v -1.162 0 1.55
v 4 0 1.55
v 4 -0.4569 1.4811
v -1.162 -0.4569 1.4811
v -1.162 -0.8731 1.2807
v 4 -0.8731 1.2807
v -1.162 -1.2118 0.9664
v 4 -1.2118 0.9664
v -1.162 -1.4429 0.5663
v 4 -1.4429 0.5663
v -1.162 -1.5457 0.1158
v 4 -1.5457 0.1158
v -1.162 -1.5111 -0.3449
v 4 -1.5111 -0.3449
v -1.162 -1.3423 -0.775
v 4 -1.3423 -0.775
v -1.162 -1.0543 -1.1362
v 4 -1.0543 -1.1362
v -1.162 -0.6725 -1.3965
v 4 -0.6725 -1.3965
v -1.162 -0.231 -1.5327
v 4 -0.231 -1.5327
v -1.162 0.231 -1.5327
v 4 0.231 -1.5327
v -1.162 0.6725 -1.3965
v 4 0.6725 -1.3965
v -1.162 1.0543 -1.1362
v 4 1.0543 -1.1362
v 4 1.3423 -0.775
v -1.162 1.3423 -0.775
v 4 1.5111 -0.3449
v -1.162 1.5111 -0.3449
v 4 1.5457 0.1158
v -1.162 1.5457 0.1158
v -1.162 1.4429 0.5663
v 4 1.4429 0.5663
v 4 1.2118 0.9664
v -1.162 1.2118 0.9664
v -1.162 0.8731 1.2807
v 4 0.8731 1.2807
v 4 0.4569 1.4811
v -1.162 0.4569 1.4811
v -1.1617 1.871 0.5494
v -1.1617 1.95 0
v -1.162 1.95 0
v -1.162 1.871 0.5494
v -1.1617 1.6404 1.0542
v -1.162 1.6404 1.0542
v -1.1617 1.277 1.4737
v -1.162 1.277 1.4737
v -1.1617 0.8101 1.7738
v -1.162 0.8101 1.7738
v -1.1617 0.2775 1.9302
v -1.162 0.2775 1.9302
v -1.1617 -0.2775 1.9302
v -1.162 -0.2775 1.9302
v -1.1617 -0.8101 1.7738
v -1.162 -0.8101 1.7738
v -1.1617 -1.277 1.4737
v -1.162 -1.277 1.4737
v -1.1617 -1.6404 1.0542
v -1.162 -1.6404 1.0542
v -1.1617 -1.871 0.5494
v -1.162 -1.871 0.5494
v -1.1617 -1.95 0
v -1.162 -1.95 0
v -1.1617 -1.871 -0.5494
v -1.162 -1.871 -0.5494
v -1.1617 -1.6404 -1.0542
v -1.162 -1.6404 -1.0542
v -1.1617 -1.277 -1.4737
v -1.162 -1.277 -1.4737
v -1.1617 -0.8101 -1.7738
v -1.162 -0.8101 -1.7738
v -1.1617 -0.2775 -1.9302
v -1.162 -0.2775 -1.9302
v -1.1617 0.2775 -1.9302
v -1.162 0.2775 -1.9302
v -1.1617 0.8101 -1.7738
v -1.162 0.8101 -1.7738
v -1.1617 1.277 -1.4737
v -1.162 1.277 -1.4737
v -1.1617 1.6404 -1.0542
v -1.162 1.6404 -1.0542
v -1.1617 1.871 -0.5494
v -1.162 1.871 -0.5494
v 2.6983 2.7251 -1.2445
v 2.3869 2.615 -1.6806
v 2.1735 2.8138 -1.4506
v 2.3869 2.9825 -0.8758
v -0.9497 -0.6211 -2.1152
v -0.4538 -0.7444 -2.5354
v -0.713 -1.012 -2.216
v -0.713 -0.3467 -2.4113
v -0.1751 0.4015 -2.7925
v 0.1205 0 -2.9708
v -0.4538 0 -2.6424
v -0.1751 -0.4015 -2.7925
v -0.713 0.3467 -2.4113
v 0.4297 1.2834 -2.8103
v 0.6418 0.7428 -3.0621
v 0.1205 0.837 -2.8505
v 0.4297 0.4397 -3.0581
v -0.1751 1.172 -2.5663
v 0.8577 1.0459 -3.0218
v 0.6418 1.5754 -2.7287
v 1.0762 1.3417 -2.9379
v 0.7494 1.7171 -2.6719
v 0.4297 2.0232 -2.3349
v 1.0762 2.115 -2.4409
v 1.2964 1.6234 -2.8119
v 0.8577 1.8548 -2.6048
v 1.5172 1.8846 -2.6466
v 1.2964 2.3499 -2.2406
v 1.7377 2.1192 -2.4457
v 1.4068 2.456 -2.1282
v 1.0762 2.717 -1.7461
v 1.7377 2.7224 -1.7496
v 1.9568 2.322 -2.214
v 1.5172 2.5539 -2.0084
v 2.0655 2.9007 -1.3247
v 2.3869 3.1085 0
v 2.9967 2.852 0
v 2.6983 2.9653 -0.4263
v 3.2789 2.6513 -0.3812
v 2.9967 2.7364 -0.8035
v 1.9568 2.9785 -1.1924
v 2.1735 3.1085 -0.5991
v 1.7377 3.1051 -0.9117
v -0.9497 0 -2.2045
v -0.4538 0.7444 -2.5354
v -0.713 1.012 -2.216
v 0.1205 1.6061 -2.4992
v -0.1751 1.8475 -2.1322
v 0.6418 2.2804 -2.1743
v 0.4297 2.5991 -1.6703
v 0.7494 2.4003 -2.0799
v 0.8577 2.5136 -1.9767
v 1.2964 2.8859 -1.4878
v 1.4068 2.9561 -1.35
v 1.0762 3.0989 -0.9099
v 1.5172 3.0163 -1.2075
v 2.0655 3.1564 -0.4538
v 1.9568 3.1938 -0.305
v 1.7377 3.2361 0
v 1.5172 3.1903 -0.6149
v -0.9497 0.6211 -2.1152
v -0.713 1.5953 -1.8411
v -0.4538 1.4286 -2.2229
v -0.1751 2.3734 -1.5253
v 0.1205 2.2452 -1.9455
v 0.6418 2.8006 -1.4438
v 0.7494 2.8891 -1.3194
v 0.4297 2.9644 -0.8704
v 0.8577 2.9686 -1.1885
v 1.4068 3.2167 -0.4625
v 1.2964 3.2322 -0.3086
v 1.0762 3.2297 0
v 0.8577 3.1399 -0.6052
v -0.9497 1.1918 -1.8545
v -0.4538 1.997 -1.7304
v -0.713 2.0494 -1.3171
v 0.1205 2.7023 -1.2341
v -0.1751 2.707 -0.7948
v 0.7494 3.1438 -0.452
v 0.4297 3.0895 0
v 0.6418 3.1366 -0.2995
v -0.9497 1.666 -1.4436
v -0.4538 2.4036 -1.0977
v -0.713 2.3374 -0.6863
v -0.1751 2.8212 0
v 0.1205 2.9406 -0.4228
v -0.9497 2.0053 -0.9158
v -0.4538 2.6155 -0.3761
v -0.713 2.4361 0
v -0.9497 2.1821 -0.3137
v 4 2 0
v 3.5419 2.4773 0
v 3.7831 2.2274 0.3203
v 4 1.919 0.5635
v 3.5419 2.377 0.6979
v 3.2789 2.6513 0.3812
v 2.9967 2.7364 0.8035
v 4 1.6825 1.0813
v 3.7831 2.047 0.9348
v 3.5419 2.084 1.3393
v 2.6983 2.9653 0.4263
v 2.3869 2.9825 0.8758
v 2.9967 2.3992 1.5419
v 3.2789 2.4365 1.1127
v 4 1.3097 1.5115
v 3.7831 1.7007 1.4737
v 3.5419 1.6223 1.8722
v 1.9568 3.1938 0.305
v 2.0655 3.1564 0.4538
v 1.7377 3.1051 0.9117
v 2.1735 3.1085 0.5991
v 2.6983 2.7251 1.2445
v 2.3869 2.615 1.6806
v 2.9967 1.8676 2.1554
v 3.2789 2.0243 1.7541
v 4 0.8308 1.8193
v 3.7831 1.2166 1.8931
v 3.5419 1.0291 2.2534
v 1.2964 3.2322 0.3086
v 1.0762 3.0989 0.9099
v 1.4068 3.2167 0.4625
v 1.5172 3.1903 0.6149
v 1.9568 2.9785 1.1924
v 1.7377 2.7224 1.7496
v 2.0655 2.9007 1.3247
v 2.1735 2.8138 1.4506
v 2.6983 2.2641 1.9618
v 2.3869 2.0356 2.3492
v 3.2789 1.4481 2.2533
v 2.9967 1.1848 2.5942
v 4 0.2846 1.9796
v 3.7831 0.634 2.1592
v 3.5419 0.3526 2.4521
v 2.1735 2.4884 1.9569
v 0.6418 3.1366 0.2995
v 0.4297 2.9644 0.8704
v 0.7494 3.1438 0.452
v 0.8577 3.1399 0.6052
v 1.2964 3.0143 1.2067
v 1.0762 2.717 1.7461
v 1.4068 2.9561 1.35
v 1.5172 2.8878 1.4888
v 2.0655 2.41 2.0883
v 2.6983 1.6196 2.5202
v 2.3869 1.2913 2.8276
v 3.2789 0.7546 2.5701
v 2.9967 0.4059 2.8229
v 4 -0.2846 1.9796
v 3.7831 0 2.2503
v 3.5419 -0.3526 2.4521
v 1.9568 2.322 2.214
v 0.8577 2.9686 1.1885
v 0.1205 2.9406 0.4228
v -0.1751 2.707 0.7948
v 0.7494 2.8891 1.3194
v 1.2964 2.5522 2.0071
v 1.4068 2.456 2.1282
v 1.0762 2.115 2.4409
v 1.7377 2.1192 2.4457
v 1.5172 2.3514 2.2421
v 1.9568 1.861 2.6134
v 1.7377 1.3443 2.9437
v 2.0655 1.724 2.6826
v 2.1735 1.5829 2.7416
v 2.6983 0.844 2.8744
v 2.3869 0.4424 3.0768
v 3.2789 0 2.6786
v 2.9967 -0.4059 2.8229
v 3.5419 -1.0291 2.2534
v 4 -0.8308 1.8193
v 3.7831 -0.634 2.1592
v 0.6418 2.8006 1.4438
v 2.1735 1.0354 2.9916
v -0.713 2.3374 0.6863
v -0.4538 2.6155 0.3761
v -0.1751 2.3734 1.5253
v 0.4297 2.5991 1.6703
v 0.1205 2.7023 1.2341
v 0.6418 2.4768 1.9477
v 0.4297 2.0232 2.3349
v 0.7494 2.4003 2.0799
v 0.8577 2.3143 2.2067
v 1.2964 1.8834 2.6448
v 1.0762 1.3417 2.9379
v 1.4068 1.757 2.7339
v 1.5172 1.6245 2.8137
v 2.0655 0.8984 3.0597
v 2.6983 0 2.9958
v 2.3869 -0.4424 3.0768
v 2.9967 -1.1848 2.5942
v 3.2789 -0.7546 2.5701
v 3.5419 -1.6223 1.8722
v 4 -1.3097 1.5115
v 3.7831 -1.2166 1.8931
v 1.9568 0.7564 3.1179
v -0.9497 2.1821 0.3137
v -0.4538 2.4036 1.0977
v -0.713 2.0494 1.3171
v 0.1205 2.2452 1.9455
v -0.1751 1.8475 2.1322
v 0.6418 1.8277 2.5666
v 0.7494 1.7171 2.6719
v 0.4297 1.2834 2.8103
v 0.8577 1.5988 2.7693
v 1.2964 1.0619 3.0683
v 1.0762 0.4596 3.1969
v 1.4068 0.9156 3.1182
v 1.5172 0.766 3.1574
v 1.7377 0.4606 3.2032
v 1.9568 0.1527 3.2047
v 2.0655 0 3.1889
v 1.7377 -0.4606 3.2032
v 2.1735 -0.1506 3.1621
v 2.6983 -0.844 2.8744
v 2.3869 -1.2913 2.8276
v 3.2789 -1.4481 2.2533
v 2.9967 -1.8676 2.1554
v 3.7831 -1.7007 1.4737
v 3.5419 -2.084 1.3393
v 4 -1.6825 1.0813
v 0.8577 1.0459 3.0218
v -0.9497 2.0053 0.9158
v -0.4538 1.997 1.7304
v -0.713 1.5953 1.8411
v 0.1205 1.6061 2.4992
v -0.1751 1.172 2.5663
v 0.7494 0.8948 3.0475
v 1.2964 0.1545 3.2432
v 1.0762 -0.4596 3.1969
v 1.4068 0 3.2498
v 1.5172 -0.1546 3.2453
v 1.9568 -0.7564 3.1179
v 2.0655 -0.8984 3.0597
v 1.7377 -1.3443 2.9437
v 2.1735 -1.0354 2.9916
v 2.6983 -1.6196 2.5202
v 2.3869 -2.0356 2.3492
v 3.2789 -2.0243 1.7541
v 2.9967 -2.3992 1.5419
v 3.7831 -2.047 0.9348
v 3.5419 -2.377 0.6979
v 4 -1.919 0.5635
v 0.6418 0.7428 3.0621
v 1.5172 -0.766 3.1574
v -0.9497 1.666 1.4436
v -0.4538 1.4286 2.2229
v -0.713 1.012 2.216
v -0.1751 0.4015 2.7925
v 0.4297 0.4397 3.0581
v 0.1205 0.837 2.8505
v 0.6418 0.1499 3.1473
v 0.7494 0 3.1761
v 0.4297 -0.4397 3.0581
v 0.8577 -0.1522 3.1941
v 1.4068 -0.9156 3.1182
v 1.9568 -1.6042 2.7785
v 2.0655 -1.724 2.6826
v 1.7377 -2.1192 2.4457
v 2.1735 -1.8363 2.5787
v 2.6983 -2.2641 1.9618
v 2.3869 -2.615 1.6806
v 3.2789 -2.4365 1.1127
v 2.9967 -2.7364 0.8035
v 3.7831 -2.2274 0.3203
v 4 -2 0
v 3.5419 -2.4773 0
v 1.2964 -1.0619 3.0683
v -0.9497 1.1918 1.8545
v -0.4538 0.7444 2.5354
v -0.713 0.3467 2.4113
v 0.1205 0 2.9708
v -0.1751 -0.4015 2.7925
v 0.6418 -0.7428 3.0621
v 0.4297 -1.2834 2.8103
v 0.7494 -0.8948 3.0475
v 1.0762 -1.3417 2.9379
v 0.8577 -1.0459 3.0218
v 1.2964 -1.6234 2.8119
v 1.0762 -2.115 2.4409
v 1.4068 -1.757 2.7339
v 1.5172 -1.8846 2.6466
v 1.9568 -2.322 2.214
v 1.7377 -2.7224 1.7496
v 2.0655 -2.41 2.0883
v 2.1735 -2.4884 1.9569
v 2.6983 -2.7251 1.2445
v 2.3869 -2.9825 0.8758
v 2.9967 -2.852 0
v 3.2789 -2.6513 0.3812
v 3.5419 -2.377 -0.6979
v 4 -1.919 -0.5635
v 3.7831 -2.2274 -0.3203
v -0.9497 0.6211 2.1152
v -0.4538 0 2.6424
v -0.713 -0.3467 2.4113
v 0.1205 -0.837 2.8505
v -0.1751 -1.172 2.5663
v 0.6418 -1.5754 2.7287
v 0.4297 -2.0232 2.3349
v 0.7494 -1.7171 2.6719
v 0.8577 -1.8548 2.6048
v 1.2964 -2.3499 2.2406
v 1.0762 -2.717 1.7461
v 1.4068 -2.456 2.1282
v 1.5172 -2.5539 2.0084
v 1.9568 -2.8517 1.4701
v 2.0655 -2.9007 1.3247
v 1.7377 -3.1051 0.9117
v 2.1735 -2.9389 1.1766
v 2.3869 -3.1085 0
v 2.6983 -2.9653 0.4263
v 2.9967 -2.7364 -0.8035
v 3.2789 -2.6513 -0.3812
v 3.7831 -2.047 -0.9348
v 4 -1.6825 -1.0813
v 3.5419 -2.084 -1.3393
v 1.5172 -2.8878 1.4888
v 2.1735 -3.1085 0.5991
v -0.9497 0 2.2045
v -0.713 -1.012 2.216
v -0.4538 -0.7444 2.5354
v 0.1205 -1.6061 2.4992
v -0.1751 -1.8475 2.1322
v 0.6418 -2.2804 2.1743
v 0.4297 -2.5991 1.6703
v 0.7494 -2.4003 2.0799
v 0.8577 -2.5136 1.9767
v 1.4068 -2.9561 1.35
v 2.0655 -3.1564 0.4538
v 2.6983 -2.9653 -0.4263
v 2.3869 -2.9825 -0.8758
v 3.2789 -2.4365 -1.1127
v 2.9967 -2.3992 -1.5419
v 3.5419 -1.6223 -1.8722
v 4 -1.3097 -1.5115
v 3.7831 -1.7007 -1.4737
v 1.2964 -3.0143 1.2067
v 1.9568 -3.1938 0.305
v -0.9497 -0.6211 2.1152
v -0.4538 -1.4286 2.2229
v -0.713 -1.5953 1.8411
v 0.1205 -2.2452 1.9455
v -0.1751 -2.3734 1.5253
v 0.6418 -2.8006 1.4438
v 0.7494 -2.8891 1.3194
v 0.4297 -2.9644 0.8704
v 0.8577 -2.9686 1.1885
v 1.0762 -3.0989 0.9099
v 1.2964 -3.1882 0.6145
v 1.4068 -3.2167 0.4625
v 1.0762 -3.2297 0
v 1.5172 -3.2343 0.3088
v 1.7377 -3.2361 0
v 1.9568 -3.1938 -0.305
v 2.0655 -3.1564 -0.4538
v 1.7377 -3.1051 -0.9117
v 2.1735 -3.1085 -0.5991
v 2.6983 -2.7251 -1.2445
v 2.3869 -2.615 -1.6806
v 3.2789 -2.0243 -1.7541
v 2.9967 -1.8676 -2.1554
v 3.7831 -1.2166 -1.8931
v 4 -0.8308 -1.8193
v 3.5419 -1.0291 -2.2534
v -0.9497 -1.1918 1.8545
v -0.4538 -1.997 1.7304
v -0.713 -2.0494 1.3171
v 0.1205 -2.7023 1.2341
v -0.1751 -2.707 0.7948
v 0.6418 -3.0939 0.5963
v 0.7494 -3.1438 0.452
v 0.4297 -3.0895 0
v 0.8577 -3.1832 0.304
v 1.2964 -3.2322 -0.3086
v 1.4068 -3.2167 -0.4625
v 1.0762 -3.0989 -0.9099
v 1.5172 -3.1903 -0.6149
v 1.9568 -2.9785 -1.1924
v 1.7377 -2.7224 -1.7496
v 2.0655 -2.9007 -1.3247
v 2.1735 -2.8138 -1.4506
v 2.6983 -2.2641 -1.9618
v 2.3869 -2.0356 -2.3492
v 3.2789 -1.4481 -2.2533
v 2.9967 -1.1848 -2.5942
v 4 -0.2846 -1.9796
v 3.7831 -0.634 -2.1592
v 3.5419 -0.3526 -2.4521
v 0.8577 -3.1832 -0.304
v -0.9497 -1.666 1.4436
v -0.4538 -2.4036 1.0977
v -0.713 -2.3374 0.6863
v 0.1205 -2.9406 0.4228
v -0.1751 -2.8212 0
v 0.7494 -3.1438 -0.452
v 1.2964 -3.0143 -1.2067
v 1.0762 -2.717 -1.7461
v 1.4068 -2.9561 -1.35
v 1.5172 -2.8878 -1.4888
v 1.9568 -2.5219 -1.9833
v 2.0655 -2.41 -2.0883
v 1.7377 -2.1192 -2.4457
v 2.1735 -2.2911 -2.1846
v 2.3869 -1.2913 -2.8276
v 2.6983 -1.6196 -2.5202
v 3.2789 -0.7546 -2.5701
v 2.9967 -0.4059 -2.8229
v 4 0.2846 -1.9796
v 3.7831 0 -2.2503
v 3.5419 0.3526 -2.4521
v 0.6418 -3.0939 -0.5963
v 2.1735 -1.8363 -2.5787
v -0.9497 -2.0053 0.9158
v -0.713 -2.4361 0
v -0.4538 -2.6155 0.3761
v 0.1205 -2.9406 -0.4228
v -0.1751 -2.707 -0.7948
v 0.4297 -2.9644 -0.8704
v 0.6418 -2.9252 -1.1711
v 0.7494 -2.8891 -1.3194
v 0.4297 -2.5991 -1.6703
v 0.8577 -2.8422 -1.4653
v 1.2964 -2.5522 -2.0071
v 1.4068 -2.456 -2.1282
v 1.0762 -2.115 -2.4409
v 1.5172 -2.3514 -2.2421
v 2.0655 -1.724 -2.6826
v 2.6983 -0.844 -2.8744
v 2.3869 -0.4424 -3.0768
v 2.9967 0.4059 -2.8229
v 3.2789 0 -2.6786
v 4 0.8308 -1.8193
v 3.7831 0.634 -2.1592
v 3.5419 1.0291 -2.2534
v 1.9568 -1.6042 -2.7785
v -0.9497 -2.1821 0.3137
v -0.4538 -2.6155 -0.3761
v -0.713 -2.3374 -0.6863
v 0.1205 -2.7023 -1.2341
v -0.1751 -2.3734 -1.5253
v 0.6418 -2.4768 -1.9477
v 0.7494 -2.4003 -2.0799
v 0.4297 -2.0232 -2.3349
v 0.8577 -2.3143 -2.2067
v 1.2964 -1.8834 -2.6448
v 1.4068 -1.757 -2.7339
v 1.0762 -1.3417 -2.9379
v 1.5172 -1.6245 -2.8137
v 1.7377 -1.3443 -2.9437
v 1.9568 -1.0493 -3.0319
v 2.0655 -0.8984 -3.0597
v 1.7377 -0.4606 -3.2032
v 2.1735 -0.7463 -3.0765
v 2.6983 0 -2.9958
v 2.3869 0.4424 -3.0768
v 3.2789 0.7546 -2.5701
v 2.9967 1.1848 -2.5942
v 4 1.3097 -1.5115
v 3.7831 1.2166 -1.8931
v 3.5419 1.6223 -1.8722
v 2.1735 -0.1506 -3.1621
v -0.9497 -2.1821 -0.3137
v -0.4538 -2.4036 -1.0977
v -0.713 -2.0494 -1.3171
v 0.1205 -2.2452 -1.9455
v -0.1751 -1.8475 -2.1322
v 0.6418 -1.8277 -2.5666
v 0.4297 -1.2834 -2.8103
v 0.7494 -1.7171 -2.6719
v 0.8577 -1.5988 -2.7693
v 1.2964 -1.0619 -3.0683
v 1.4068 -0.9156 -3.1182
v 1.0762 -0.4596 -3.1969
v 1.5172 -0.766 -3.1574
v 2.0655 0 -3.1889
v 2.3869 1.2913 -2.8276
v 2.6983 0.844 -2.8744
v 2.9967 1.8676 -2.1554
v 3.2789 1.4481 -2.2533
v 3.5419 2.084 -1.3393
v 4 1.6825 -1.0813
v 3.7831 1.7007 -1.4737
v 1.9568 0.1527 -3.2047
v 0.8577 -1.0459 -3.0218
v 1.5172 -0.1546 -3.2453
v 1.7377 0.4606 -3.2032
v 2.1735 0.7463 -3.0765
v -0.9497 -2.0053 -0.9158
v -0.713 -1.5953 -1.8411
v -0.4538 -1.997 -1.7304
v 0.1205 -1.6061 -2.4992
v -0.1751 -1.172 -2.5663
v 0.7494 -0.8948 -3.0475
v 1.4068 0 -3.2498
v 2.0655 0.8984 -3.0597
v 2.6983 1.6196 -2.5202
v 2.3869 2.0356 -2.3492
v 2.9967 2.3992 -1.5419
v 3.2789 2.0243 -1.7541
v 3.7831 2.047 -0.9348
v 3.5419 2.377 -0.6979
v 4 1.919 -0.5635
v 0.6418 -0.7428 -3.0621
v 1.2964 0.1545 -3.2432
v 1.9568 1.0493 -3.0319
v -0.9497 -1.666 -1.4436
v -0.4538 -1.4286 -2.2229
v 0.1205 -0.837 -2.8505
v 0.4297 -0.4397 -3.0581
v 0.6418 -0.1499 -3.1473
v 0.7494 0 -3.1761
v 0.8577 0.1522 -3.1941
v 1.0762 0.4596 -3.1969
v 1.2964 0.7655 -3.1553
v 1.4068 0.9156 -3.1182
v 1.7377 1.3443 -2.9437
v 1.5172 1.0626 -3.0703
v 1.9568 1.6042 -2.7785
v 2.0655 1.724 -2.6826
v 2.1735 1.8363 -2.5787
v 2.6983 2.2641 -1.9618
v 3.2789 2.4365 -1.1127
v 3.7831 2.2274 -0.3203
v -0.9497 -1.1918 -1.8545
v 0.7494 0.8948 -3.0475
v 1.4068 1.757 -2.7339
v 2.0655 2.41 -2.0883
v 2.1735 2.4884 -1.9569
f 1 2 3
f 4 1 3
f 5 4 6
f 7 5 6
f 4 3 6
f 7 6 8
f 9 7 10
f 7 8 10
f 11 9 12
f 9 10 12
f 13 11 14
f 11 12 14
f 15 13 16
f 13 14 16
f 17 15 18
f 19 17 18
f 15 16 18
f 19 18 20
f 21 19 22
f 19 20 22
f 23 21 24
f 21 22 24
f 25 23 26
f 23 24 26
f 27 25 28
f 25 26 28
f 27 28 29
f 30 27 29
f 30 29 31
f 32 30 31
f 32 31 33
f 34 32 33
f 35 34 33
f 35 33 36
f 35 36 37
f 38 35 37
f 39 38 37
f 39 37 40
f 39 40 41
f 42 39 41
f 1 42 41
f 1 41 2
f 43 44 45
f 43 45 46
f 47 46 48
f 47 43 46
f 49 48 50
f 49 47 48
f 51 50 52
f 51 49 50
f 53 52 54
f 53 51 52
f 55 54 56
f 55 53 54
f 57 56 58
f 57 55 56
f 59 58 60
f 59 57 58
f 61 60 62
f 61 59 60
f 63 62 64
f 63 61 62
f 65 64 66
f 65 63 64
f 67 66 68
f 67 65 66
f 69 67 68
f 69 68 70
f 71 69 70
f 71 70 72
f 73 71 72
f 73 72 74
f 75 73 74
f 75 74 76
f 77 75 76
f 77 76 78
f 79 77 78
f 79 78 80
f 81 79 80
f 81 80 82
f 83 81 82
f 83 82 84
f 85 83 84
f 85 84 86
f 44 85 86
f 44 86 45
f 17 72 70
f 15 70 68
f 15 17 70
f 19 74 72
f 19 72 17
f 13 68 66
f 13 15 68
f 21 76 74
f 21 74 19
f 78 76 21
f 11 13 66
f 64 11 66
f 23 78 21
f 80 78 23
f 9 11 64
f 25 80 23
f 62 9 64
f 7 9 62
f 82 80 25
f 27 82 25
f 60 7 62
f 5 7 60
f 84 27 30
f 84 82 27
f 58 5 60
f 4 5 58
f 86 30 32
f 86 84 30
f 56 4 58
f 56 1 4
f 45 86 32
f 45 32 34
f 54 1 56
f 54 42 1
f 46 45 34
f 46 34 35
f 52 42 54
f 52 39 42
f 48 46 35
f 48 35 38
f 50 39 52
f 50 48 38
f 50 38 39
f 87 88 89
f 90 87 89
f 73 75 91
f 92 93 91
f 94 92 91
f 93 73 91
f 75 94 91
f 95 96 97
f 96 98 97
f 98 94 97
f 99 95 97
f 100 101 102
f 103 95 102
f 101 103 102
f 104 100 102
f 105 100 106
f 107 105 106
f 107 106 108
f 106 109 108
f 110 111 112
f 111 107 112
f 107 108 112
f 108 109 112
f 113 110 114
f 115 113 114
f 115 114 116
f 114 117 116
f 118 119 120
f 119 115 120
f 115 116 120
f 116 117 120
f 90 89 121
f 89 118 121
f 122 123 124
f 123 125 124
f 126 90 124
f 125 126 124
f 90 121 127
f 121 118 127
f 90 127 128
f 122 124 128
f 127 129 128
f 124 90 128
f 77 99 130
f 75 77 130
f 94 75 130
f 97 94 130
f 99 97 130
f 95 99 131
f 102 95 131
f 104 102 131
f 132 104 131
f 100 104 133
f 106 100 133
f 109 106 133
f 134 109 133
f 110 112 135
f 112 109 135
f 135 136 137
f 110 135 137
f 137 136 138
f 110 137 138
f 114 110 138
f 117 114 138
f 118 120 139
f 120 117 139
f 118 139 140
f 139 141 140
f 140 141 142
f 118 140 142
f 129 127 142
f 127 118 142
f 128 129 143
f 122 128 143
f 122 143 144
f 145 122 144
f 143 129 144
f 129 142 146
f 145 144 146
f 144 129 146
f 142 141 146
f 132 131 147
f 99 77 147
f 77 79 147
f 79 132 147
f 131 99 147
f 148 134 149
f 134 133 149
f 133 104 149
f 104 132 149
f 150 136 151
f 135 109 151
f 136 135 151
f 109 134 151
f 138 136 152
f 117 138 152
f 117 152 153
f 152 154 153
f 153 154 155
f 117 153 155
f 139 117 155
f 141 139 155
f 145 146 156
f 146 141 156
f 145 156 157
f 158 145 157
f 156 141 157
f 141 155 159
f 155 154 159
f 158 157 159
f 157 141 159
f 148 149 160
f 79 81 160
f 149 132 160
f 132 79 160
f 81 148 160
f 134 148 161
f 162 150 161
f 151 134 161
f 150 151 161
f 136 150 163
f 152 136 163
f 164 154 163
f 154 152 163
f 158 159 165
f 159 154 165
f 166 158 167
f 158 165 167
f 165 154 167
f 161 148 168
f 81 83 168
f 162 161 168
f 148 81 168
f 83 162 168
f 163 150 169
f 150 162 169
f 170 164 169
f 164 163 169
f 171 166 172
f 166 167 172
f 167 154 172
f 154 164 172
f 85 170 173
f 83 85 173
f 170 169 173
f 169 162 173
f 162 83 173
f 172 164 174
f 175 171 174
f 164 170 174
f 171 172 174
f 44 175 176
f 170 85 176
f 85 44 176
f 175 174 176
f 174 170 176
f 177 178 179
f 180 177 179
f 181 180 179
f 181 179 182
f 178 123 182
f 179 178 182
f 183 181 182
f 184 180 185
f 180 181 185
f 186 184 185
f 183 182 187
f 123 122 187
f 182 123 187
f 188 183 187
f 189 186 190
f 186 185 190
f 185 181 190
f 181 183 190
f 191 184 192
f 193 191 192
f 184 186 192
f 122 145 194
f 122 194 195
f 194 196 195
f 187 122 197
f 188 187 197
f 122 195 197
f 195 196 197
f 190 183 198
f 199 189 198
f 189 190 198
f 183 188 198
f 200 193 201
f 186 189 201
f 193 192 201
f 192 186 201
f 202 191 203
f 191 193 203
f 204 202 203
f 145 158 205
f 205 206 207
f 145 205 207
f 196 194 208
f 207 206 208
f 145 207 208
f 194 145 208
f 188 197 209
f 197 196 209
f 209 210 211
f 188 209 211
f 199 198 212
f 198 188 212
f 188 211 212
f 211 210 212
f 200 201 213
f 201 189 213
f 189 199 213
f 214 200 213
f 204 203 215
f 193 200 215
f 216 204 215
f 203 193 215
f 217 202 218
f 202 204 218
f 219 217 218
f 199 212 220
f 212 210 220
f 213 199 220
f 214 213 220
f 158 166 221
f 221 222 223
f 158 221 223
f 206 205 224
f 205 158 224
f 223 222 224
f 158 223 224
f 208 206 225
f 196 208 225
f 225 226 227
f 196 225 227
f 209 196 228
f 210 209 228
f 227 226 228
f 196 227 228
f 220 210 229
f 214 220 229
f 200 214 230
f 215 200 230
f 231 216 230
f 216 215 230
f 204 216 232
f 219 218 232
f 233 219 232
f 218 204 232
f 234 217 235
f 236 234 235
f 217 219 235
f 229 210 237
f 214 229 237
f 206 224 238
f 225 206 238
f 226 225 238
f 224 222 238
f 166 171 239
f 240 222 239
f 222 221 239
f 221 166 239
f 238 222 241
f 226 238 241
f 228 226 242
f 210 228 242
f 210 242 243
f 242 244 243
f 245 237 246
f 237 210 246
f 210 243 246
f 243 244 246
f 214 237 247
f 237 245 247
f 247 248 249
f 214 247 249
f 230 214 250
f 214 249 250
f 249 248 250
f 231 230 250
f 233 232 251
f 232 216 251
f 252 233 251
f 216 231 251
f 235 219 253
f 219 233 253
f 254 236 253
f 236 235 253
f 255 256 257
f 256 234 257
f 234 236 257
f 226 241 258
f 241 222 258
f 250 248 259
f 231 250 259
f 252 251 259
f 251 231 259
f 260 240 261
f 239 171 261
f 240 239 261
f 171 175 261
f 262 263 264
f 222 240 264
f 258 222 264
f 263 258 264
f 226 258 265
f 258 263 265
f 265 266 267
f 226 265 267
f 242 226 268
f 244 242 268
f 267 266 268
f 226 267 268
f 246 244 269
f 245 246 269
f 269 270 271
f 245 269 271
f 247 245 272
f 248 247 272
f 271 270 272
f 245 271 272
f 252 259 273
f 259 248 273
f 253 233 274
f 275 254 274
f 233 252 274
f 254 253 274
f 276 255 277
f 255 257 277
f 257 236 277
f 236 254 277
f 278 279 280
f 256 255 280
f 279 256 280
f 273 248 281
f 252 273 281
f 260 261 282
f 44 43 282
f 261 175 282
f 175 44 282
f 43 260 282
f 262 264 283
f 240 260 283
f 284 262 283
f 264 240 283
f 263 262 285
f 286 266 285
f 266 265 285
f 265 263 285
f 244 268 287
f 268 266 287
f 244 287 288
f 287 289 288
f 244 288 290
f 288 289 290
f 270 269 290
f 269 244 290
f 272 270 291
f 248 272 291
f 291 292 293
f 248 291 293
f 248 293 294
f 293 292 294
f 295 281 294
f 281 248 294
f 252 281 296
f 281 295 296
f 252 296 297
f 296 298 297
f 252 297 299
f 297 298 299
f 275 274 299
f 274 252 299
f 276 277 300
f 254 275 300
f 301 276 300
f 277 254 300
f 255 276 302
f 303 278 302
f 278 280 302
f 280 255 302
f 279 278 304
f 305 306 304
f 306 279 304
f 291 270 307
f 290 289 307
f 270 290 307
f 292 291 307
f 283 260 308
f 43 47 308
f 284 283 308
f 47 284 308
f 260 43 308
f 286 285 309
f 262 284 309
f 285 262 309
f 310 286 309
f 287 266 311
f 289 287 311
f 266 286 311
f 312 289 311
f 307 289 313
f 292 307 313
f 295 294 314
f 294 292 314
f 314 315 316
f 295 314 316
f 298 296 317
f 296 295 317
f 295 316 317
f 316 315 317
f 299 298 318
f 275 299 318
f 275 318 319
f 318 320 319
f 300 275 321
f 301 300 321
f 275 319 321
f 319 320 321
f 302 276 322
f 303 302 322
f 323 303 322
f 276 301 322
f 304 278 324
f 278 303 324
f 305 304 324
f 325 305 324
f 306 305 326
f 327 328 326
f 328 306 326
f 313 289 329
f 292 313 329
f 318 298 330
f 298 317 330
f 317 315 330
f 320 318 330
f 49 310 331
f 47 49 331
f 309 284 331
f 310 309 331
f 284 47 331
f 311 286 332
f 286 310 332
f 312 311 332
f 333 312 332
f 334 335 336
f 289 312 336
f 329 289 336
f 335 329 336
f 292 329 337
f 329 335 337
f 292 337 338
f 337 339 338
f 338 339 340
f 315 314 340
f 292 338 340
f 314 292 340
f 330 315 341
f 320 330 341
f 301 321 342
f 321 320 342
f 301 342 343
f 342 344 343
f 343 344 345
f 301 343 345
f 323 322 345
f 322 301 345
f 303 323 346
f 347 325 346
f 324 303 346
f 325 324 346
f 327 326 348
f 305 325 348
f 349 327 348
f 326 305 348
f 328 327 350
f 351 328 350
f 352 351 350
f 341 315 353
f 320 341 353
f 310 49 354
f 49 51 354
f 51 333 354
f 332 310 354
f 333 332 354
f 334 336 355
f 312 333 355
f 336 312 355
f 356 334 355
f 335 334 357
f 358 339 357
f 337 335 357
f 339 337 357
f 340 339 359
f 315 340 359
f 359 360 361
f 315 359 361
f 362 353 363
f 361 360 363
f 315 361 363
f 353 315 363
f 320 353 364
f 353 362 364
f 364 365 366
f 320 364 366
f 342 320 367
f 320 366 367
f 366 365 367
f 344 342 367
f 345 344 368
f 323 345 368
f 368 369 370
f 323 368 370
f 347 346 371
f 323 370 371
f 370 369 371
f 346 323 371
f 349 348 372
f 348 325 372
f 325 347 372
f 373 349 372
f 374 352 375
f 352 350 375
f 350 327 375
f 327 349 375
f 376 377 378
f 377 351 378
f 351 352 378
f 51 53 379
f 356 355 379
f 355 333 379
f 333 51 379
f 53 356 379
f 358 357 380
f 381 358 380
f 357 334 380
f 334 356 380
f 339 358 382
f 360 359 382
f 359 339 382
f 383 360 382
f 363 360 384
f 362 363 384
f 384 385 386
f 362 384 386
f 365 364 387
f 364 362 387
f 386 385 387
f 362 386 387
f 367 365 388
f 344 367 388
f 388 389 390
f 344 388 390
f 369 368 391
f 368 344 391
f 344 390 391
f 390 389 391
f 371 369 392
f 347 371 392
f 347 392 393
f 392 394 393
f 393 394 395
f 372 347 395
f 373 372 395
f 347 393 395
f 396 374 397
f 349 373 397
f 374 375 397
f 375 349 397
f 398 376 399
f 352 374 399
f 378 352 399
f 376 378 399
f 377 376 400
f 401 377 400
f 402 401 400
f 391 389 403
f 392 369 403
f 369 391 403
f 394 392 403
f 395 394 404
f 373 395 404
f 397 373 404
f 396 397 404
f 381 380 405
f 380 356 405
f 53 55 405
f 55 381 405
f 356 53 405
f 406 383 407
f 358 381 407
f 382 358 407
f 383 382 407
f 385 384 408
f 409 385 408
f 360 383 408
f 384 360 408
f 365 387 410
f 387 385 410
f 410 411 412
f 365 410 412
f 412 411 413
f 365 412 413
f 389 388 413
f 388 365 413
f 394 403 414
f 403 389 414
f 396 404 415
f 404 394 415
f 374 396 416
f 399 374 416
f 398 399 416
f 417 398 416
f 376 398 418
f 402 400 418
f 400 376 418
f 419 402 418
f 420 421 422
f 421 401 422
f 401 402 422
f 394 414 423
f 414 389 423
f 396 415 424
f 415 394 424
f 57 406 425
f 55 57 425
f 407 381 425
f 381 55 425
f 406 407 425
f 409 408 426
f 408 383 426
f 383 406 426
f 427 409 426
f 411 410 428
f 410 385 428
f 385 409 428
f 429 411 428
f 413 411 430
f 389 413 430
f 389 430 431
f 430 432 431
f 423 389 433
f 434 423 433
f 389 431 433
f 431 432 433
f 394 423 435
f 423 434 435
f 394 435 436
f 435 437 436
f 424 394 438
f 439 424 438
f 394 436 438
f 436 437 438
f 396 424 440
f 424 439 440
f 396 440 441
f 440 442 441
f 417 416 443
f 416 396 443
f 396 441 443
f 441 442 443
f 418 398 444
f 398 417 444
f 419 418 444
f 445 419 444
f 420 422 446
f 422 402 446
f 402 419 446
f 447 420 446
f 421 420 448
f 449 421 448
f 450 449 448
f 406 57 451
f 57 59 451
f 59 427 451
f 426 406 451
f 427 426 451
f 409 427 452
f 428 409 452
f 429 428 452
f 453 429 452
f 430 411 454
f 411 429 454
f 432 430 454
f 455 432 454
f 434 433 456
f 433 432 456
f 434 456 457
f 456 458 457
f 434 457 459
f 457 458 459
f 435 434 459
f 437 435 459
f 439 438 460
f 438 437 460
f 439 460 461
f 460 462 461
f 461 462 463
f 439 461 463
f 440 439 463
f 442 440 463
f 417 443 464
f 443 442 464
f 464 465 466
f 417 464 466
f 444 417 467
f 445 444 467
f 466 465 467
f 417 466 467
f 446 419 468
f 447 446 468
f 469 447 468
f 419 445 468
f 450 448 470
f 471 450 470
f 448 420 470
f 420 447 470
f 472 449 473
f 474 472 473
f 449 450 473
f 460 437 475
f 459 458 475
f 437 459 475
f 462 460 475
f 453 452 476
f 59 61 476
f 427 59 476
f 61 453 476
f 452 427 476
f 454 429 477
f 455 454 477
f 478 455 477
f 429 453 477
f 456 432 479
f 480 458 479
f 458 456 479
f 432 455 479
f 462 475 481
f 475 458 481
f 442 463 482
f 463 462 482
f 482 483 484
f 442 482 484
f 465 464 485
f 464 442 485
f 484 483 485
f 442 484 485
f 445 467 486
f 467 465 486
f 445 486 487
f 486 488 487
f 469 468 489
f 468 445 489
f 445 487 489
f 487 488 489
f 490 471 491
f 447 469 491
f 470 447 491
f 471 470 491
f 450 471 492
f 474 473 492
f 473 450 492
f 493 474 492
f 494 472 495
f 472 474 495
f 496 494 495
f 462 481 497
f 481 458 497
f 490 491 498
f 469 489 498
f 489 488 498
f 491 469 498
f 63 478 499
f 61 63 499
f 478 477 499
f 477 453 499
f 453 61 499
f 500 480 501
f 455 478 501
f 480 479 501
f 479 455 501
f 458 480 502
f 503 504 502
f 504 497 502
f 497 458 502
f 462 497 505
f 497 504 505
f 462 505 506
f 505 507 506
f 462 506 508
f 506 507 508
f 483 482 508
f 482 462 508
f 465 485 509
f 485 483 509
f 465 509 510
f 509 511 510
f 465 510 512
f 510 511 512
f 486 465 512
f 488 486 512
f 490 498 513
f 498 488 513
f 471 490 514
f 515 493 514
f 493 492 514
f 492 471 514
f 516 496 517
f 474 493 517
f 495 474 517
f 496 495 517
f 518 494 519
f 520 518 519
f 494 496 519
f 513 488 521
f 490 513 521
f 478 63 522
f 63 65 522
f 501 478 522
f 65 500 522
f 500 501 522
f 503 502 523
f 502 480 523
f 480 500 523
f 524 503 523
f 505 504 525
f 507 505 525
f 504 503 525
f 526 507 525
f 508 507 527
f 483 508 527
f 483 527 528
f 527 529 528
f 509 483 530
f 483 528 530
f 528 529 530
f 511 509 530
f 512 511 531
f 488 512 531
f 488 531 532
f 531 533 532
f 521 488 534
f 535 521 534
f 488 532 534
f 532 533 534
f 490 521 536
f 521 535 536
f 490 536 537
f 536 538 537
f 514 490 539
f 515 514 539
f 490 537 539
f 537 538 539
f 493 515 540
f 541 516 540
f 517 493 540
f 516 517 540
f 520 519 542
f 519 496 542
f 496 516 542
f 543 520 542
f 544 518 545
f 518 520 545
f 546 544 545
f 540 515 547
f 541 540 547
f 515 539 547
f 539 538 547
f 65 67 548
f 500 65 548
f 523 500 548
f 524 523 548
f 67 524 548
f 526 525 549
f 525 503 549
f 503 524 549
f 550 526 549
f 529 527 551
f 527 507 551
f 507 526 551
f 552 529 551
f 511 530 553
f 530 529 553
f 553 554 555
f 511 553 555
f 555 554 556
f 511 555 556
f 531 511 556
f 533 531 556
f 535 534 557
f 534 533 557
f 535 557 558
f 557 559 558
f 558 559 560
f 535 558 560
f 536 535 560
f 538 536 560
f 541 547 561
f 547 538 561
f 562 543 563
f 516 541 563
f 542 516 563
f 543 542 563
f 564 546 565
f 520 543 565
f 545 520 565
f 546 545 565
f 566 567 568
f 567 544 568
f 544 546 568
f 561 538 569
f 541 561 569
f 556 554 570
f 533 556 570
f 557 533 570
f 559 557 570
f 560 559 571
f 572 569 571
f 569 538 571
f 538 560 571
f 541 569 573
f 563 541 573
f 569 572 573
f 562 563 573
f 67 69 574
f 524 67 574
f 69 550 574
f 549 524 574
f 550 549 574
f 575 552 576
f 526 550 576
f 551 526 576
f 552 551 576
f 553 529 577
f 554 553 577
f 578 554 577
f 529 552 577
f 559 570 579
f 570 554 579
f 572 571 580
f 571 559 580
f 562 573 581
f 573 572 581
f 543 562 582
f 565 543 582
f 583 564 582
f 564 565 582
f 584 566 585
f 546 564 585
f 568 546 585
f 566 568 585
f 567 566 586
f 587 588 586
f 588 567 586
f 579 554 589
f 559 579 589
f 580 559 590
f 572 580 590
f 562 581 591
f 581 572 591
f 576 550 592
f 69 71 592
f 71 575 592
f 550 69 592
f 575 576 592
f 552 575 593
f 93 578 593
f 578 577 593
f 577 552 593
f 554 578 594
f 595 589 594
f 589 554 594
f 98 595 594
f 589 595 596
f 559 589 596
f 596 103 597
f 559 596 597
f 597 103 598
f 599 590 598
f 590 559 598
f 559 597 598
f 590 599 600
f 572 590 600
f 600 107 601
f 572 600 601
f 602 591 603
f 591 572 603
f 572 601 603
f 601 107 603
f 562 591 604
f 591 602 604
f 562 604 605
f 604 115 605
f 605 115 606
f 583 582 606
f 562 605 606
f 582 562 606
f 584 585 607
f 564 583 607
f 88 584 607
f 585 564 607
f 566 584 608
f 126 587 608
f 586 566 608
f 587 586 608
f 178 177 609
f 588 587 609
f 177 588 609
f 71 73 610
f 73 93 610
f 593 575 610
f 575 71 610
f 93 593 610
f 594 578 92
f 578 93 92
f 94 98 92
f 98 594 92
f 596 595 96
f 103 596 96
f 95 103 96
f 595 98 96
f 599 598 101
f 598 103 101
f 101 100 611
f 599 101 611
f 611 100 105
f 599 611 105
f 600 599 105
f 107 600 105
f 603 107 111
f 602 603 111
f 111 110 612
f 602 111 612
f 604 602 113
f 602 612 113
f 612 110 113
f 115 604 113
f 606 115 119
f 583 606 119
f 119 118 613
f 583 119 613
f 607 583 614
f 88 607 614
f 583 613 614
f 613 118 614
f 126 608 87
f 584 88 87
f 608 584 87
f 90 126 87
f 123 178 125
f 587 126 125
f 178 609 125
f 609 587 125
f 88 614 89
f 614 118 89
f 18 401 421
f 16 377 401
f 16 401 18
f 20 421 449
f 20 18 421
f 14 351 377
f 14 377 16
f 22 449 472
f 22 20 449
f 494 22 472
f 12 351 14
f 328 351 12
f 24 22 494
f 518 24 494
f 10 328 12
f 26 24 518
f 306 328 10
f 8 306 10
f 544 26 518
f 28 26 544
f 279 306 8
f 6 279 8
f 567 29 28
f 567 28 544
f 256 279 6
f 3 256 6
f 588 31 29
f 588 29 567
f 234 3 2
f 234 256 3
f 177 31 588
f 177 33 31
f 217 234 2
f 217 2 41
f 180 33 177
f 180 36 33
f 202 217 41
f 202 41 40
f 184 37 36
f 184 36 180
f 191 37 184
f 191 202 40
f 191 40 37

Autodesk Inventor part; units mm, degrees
ref_plane "YZ Plane" through (0, 0, 0) normal (1, 0, 0) x (0, 1, 0)
ref_plane "XZ Plane" through (0, 0, 0) normal (0, 1, 0) x (-1, 0, 0)
ref_plane "XY Plane" through (0, 0, 0) normal (0, 0, 1) x (1, 0, 0)
sketch "Esquisse1" plane through (0, 0, 0) normal (0, 0, 1) x (1, 0, 0)
  line L0 (-7.1186, 0) -> (5.8768, 0)
  line L1 (-4, 0) -> (-4, 3.25)
  line L2 (-4, 3.25) -> (-2.5, 3.25)
  line L3 (-2.5, 3.25) -> (-1.5, 1.95)
  line L4 (-1.5, 1.95) -> (-1.1617, 1.95)
  arc A0 (4, 2) -> (-1.1617, 1.95) centre (1.4383, 0) ccw
  line L5 (4, 2) -> (4, 0)
  line L6 (-4, 0) -> (4, 0)
  point P0 (0, 0)
  dimension "d1" = 6.5
  dimension "d2" = 8
  dimension "d3" = 1.5
  dimension "d5" = 2.5
  dimension "d6" = 4
  dimension "d7" = 6.5
  dimension "d8" = 4
  dimension "d9" = 3.9
revolve "Révolution1" add sketch "Esquisse1" angle 360 about axis through (-7.1186, 0, 0) along (1, 0, 0)
sketch "Esquisse2" plane through (-4, 0, 0) normal (-1, 0, 0) x (0, 0, 1)
  point P0 (0, 0)
  point P1 (0, 0)
hole "Perçage1" at (-4, 0, 0) direction (1, 0, 0) diameter 3.1 end through all countersink diameter 3.5 countersink angle 90
sketch "Esquisse3" plane through (-4, 0, 0) normal (-1, 0, 0) x (0, 0, 1)
  circle A0 centre (0, 0) radius 3.25 projected
extrude "Extrusion1" cut sketch "Esquisse3" against normal blind 2.838
equation "\"d8\" = 0.5 * d2"
properties part number "Rotule simple" material "Laiton, jaune doux"
